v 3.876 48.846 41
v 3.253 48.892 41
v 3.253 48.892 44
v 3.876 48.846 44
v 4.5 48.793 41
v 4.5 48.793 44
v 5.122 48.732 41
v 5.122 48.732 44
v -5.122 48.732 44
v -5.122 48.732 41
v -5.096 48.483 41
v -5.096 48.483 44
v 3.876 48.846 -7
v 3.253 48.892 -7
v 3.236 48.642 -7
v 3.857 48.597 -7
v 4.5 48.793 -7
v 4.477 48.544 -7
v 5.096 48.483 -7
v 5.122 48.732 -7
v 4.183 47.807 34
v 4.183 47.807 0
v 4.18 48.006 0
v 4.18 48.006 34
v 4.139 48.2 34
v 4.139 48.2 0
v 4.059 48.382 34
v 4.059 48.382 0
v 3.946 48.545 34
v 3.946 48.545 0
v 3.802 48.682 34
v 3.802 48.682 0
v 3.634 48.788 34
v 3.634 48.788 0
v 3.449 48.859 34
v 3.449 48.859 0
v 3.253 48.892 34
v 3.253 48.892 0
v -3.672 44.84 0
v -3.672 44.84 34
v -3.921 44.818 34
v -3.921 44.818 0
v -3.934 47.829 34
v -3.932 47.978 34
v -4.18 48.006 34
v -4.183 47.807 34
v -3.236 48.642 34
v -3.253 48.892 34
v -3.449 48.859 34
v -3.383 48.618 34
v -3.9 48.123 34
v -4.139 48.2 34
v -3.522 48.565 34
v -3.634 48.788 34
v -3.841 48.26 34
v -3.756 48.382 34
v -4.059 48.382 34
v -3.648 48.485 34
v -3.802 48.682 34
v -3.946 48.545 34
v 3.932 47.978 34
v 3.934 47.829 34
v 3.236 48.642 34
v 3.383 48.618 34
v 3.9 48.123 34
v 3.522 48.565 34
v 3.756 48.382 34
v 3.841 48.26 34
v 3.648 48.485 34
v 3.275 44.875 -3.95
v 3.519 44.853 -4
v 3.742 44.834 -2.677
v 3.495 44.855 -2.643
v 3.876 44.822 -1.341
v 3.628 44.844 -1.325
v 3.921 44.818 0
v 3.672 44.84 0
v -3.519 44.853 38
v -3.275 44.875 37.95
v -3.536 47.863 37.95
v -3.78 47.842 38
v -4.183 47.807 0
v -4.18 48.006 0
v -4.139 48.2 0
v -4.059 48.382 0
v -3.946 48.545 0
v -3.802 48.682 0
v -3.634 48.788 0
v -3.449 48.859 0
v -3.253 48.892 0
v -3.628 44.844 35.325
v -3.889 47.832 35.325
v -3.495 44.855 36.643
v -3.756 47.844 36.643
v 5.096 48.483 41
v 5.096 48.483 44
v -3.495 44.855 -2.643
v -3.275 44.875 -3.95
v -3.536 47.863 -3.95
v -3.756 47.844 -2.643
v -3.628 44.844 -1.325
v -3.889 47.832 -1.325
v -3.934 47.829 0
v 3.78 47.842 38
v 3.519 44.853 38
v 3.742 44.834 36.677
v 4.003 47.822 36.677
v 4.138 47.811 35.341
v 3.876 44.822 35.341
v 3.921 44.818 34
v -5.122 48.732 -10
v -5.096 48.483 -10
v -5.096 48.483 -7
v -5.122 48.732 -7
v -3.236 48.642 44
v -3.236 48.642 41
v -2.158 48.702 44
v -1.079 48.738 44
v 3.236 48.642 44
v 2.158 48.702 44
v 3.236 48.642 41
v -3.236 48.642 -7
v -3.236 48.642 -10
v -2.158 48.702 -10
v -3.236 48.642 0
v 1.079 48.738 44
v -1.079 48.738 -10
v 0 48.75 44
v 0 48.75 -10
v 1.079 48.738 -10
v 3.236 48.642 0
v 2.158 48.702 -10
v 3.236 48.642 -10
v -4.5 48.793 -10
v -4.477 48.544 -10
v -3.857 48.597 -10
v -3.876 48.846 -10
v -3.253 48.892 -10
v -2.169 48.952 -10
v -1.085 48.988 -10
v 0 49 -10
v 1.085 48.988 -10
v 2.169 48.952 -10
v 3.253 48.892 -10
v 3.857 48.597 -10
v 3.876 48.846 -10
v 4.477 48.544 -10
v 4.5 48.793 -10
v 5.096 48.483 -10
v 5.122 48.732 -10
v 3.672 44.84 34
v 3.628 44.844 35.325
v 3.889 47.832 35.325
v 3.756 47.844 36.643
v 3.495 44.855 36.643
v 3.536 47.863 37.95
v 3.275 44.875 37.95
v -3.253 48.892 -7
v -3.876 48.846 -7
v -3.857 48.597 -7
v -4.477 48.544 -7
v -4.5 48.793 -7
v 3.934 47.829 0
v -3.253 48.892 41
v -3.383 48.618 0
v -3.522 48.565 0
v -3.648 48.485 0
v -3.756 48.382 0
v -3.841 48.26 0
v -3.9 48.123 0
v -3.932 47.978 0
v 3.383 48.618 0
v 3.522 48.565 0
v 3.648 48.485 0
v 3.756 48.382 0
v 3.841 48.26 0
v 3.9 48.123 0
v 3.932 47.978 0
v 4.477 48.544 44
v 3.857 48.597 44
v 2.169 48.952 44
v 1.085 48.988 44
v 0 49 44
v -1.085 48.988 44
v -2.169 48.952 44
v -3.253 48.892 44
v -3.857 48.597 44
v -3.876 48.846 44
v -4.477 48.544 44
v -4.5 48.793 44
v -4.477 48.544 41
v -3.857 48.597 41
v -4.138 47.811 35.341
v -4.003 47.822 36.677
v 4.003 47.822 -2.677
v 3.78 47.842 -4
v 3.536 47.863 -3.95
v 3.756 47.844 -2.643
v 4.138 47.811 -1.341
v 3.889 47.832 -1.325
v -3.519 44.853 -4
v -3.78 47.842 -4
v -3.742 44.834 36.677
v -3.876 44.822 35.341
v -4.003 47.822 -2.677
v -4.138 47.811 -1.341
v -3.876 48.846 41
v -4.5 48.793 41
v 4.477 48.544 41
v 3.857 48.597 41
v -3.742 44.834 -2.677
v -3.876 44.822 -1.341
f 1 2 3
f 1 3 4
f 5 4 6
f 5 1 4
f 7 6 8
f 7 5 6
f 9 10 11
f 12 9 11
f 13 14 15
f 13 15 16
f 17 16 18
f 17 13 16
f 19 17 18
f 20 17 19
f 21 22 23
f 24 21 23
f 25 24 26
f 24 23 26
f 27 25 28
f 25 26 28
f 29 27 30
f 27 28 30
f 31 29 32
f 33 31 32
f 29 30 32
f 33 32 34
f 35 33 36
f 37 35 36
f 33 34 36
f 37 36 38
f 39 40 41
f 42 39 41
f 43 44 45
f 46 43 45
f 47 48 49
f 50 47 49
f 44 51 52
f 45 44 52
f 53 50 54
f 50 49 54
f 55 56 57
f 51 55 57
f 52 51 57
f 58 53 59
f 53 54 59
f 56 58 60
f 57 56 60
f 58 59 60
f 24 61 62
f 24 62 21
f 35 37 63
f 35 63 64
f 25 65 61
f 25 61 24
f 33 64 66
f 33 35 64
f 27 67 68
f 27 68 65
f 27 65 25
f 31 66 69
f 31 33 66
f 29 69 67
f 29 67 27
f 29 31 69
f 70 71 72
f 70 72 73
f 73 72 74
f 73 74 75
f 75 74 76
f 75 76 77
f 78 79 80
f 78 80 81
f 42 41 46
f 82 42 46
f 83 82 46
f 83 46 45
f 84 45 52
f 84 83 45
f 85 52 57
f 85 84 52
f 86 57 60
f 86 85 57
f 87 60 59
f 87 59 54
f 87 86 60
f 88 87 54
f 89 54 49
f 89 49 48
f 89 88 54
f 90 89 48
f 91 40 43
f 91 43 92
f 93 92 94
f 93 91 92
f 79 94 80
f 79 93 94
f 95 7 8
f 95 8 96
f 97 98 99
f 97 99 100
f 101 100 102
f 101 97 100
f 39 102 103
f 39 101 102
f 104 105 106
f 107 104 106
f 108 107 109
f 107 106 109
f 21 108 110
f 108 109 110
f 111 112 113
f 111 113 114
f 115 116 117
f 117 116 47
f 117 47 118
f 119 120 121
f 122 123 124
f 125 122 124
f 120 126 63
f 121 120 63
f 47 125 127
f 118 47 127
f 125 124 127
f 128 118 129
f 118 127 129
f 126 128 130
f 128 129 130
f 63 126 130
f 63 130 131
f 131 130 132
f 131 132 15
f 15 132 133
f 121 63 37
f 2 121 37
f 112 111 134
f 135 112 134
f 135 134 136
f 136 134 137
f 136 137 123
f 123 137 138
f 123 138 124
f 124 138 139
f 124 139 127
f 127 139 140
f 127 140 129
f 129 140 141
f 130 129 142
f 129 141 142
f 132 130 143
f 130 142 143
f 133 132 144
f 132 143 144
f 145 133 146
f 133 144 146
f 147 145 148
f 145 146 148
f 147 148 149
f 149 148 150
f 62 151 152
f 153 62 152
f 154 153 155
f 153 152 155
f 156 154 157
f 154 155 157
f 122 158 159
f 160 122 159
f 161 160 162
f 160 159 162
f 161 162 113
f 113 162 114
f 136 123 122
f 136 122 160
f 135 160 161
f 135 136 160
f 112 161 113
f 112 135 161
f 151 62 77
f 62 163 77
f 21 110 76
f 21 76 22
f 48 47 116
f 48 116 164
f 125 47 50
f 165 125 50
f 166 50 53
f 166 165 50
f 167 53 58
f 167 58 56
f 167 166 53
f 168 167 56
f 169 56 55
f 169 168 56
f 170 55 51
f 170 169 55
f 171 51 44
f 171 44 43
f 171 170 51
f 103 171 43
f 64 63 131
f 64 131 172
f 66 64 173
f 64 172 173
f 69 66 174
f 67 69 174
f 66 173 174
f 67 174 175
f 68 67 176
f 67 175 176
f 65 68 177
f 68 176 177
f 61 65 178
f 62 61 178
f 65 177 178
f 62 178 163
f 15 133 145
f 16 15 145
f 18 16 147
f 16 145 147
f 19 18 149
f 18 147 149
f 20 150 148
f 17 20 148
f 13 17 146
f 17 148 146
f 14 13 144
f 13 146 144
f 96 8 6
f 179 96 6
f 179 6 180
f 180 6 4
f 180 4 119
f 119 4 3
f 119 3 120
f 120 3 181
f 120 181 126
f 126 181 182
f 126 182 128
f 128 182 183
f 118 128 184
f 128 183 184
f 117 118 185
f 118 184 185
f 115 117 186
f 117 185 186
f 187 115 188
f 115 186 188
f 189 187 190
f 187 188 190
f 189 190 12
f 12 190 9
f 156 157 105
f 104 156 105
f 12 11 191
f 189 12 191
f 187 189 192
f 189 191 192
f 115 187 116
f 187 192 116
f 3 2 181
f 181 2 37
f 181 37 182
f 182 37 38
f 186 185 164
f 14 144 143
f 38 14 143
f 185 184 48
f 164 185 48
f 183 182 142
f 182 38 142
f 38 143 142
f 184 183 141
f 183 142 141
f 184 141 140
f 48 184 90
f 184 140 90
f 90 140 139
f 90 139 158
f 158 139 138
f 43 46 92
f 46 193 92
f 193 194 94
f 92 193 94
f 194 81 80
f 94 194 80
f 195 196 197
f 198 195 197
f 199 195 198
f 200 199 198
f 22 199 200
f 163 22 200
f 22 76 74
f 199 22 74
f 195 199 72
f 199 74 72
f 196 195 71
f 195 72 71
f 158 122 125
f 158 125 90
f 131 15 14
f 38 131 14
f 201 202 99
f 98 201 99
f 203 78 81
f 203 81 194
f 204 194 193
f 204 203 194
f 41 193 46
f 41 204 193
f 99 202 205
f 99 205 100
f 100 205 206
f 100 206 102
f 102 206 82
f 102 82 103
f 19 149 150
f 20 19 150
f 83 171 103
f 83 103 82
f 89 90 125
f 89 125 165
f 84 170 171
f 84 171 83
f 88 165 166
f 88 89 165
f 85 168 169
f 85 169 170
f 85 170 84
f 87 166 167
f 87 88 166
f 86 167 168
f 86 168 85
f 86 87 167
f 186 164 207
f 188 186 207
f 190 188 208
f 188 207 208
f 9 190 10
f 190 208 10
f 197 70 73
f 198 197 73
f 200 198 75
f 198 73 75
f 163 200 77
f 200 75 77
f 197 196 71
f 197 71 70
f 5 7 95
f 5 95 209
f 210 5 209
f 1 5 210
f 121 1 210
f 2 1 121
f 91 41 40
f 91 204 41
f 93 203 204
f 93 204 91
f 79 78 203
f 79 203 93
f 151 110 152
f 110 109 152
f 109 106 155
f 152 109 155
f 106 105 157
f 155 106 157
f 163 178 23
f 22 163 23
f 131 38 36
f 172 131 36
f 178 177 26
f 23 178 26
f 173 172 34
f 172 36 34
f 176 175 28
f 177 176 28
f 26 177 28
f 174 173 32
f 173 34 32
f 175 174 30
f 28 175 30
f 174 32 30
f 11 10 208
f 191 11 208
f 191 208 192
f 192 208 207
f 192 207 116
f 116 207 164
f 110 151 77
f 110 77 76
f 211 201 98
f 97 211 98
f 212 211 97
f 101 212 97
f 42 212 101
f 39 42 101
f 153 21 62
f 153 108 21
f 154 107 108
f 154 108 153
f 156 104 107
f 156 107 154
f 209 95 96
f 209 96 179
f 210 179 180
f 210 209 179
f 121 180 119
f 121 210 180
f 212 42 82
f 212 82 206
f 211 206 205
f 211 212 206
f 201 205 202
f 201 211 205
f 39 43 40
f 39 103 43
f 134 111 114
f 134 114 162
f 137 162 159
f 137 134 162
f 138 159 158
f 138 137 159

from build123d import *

# Parameters (mm, degrees)
EXTRUSION1_DEPTH = 34
EXTRUSION2_DEPTH = 3
EXTRUSION3_START = 10
EXTRUSION3_DEPTH = 10
EXTRUSION4_DEPTH = 10
EXTRUSION5_START = -3
EXTRUSION5_DEPTH = 3
EXTRUSION6_DEPTH = 3


with BuildPart() as part:
    # Esquisse1 → Extrusion1 (new body)
    with BuildSketch(Plane.XY):
        with BuildLine():
            Line((-3.933519007, 47.82875629), (-3.672032862, 44.839955984))
            Line((-3.672032862, 44.839955984), (-3.921081537, 44.818167048))
            Line((-3.921081537, 44.818167048), (-4.182567681, 47.806967354))
            ThreePointArc((-4.182567681, 47.806967354), (-3.945679792, 48.544855891), (-3.252755753, 48.891917328))
            ThreePointArc((-3.252755753, 48.891917328), (-1.627275473, 48.972971878), (0, 49))
            Line((0, 49), (0, 48.75))
            ThreePointArc((0, 48.75), (-1.618973047, 48.723109776), (-3.236160061, 48.64246877))
            ThreePointArc((-3.236160061, 48.64246877), (-3.75585309, 48.382172692), (-3.933519007, 47.82875629))
        make_face()
    extrusion1 = extrude(amount=EXTRUSION1_DEPTH)

    # Esquisse2 → Extrusion2 (add)
    with BuildSketch(Plane(origin=(-3.921081537, 44.818167048, 0), x_dir=(0.9961946980917463, 0.08715574274764933, 0), z_dir=(0.08715574274764933, -0.9961946980917464, 0))):
        with BuildLine():
            Line((0, 34), (0.25, 34))
            ThreePointArc((0.25, 34), (0.350010978, 35.985052), (0.649031032, 37.95))
            Line((0.649031032, 37.95), (0.404082058, 38))
            ThreePointArc((0.404082058, 38), (0.10127694, 36.01017924), (0, 34))
        make_face()
        with BuildLine():
            Line((0.404082058, -4), (0.649031032, -3.95))
            ThreePointArc((0.649031032, -3.95), (0.350010978, -1.985052), (0.25, 0))
            Line((0.25, 0), (0, 0))
            ThreePointArc((0, 0), (0.10127694, -2.01017924), (0.404082058, -4))
        make_face()
    extrusion2 = extrude(amount=-EXTRUSION2_DEPTH)

    # Esquisse3 → Extrusion3 (add)
    with BuildSketch(Plane(origin=(0, 0, 0), x_dir=(-1, 0, 0), z_dir=(0, 0, -1)).offset(EXTRUSION3_START)):
        with BuildLine():
            Line((3.236160061, 48.64246877), (3.252755753, 48.891917328))
            ThreePointArc((3.252755753, 48.891917328), (1.627275473, 48.972971878), (0, 49))
            Line((0, 49), (0, 48.75))
            ThreePointArc((0, 48.75), (1.618973047, 48.723109776), (3.236160061, 48.64246877))
        make_face()
    extrusion3 = extrude(amount=-EXTRUSION3_DEPTH)

    # Esquisse4 → Extrusion4 (add)
    with BuildSketch(Plane.XY.offset(34)):
        with BuildLine():
            Line((-3.236160061, 48.64246877), (-3.252755753, 48.891917328))
            ThreePointArc((-3.252755753, 48.891917328), (-1.627275473, 48.972971878), (0, 49))
            Line((0, 49), (0, 48.75))
            ThreePointArc((0, 48.75), (-1.618973047, 48.723109776), (-3.236160061, 48.64246877))
        make_face()
    extrusion4 = extrude(amount=EXTRUSION4_DEPTH)

    # Esquisse5 → Extrusion5 (add)
    with BuildSketch(Plane.XY.offset(44).offset(EXTRUSION5_START)):
        with BuildLine():
            Line((-5.1218947, 48.731572873), (-5.095762584, 48.482942399))
            ThreePointArc((-5.095762584, 48.482942399), (-2.551377867, 48.683189819), (0, 48.75))
            Line((0, 48.75), (0, 49))
            ThreePointArc((0, 49), (-2.564461856, 48.932847203), (-5.1218947, 48.731572873))
        make_face()
    extrusion5 = extrude(amount=EXTRUSION5_DEPTH)

    # Esquisse6 → Extrusion6 (add)
    with BuildSketch(Plane(origin=(0, 0, -10), x_dir=(-1, 0, 0), z_dir=(0, 0, -1))):
        with BuildLine():
            Line((0, 49), (0, 48.75))
            ThreePointArc((0, 48.75), (2.551377867, 48.683189819), (5.095762584, 48.482942399))
            Line((5.095762584, 48.482942399), (5.1218947, 48.731572873))
            ThreePointArc((5.1218947, 48.731572873), (2.564461856, 48.932847203), (0, 49))
        make_face()
    extrusion6 = extrude(amount=-EXTRUSION6_DEPTH)

    # Symétrie1: Extrusion1, Extrusion2, Extrusion3, Extrusion4, Extrusion5, Extrusion6 across plane
    add(extrusion1.mirror(Plane(origin=(0, 48.75, 34), x_dir=(0, 0, 1), z_dir=(-1, 0, 0))))
    add(extrusion2.mirror(Plane(origin=(0, 48.75, 34), x_dir=(0, 0, 1), z_dir=(-1, 0, 0))))
    add(extrusion3.mirror(Plane(origin=(0, 48.75, 34), x_dir=(0, 0, 1), z_dir=(-1, 0, 0))))
    add(extrusion4.mirror(Plane(origin=(0, 48.75, 34), x_dir=(0, 0, 1), z_dir=(-1, 0, 0))))
    add(extrusion5.mirror(Plane(origin=(0, 48.75, 34), x_dir=(0, 0, 1), z_dir=(-1, 0, 0))))
    add(extrusion6.mirror(Plane(origin=(0, 48.75, 34), x_dir=(0, 0, 1), z_dir=(-1, 0, 0))))


solid = part.part
